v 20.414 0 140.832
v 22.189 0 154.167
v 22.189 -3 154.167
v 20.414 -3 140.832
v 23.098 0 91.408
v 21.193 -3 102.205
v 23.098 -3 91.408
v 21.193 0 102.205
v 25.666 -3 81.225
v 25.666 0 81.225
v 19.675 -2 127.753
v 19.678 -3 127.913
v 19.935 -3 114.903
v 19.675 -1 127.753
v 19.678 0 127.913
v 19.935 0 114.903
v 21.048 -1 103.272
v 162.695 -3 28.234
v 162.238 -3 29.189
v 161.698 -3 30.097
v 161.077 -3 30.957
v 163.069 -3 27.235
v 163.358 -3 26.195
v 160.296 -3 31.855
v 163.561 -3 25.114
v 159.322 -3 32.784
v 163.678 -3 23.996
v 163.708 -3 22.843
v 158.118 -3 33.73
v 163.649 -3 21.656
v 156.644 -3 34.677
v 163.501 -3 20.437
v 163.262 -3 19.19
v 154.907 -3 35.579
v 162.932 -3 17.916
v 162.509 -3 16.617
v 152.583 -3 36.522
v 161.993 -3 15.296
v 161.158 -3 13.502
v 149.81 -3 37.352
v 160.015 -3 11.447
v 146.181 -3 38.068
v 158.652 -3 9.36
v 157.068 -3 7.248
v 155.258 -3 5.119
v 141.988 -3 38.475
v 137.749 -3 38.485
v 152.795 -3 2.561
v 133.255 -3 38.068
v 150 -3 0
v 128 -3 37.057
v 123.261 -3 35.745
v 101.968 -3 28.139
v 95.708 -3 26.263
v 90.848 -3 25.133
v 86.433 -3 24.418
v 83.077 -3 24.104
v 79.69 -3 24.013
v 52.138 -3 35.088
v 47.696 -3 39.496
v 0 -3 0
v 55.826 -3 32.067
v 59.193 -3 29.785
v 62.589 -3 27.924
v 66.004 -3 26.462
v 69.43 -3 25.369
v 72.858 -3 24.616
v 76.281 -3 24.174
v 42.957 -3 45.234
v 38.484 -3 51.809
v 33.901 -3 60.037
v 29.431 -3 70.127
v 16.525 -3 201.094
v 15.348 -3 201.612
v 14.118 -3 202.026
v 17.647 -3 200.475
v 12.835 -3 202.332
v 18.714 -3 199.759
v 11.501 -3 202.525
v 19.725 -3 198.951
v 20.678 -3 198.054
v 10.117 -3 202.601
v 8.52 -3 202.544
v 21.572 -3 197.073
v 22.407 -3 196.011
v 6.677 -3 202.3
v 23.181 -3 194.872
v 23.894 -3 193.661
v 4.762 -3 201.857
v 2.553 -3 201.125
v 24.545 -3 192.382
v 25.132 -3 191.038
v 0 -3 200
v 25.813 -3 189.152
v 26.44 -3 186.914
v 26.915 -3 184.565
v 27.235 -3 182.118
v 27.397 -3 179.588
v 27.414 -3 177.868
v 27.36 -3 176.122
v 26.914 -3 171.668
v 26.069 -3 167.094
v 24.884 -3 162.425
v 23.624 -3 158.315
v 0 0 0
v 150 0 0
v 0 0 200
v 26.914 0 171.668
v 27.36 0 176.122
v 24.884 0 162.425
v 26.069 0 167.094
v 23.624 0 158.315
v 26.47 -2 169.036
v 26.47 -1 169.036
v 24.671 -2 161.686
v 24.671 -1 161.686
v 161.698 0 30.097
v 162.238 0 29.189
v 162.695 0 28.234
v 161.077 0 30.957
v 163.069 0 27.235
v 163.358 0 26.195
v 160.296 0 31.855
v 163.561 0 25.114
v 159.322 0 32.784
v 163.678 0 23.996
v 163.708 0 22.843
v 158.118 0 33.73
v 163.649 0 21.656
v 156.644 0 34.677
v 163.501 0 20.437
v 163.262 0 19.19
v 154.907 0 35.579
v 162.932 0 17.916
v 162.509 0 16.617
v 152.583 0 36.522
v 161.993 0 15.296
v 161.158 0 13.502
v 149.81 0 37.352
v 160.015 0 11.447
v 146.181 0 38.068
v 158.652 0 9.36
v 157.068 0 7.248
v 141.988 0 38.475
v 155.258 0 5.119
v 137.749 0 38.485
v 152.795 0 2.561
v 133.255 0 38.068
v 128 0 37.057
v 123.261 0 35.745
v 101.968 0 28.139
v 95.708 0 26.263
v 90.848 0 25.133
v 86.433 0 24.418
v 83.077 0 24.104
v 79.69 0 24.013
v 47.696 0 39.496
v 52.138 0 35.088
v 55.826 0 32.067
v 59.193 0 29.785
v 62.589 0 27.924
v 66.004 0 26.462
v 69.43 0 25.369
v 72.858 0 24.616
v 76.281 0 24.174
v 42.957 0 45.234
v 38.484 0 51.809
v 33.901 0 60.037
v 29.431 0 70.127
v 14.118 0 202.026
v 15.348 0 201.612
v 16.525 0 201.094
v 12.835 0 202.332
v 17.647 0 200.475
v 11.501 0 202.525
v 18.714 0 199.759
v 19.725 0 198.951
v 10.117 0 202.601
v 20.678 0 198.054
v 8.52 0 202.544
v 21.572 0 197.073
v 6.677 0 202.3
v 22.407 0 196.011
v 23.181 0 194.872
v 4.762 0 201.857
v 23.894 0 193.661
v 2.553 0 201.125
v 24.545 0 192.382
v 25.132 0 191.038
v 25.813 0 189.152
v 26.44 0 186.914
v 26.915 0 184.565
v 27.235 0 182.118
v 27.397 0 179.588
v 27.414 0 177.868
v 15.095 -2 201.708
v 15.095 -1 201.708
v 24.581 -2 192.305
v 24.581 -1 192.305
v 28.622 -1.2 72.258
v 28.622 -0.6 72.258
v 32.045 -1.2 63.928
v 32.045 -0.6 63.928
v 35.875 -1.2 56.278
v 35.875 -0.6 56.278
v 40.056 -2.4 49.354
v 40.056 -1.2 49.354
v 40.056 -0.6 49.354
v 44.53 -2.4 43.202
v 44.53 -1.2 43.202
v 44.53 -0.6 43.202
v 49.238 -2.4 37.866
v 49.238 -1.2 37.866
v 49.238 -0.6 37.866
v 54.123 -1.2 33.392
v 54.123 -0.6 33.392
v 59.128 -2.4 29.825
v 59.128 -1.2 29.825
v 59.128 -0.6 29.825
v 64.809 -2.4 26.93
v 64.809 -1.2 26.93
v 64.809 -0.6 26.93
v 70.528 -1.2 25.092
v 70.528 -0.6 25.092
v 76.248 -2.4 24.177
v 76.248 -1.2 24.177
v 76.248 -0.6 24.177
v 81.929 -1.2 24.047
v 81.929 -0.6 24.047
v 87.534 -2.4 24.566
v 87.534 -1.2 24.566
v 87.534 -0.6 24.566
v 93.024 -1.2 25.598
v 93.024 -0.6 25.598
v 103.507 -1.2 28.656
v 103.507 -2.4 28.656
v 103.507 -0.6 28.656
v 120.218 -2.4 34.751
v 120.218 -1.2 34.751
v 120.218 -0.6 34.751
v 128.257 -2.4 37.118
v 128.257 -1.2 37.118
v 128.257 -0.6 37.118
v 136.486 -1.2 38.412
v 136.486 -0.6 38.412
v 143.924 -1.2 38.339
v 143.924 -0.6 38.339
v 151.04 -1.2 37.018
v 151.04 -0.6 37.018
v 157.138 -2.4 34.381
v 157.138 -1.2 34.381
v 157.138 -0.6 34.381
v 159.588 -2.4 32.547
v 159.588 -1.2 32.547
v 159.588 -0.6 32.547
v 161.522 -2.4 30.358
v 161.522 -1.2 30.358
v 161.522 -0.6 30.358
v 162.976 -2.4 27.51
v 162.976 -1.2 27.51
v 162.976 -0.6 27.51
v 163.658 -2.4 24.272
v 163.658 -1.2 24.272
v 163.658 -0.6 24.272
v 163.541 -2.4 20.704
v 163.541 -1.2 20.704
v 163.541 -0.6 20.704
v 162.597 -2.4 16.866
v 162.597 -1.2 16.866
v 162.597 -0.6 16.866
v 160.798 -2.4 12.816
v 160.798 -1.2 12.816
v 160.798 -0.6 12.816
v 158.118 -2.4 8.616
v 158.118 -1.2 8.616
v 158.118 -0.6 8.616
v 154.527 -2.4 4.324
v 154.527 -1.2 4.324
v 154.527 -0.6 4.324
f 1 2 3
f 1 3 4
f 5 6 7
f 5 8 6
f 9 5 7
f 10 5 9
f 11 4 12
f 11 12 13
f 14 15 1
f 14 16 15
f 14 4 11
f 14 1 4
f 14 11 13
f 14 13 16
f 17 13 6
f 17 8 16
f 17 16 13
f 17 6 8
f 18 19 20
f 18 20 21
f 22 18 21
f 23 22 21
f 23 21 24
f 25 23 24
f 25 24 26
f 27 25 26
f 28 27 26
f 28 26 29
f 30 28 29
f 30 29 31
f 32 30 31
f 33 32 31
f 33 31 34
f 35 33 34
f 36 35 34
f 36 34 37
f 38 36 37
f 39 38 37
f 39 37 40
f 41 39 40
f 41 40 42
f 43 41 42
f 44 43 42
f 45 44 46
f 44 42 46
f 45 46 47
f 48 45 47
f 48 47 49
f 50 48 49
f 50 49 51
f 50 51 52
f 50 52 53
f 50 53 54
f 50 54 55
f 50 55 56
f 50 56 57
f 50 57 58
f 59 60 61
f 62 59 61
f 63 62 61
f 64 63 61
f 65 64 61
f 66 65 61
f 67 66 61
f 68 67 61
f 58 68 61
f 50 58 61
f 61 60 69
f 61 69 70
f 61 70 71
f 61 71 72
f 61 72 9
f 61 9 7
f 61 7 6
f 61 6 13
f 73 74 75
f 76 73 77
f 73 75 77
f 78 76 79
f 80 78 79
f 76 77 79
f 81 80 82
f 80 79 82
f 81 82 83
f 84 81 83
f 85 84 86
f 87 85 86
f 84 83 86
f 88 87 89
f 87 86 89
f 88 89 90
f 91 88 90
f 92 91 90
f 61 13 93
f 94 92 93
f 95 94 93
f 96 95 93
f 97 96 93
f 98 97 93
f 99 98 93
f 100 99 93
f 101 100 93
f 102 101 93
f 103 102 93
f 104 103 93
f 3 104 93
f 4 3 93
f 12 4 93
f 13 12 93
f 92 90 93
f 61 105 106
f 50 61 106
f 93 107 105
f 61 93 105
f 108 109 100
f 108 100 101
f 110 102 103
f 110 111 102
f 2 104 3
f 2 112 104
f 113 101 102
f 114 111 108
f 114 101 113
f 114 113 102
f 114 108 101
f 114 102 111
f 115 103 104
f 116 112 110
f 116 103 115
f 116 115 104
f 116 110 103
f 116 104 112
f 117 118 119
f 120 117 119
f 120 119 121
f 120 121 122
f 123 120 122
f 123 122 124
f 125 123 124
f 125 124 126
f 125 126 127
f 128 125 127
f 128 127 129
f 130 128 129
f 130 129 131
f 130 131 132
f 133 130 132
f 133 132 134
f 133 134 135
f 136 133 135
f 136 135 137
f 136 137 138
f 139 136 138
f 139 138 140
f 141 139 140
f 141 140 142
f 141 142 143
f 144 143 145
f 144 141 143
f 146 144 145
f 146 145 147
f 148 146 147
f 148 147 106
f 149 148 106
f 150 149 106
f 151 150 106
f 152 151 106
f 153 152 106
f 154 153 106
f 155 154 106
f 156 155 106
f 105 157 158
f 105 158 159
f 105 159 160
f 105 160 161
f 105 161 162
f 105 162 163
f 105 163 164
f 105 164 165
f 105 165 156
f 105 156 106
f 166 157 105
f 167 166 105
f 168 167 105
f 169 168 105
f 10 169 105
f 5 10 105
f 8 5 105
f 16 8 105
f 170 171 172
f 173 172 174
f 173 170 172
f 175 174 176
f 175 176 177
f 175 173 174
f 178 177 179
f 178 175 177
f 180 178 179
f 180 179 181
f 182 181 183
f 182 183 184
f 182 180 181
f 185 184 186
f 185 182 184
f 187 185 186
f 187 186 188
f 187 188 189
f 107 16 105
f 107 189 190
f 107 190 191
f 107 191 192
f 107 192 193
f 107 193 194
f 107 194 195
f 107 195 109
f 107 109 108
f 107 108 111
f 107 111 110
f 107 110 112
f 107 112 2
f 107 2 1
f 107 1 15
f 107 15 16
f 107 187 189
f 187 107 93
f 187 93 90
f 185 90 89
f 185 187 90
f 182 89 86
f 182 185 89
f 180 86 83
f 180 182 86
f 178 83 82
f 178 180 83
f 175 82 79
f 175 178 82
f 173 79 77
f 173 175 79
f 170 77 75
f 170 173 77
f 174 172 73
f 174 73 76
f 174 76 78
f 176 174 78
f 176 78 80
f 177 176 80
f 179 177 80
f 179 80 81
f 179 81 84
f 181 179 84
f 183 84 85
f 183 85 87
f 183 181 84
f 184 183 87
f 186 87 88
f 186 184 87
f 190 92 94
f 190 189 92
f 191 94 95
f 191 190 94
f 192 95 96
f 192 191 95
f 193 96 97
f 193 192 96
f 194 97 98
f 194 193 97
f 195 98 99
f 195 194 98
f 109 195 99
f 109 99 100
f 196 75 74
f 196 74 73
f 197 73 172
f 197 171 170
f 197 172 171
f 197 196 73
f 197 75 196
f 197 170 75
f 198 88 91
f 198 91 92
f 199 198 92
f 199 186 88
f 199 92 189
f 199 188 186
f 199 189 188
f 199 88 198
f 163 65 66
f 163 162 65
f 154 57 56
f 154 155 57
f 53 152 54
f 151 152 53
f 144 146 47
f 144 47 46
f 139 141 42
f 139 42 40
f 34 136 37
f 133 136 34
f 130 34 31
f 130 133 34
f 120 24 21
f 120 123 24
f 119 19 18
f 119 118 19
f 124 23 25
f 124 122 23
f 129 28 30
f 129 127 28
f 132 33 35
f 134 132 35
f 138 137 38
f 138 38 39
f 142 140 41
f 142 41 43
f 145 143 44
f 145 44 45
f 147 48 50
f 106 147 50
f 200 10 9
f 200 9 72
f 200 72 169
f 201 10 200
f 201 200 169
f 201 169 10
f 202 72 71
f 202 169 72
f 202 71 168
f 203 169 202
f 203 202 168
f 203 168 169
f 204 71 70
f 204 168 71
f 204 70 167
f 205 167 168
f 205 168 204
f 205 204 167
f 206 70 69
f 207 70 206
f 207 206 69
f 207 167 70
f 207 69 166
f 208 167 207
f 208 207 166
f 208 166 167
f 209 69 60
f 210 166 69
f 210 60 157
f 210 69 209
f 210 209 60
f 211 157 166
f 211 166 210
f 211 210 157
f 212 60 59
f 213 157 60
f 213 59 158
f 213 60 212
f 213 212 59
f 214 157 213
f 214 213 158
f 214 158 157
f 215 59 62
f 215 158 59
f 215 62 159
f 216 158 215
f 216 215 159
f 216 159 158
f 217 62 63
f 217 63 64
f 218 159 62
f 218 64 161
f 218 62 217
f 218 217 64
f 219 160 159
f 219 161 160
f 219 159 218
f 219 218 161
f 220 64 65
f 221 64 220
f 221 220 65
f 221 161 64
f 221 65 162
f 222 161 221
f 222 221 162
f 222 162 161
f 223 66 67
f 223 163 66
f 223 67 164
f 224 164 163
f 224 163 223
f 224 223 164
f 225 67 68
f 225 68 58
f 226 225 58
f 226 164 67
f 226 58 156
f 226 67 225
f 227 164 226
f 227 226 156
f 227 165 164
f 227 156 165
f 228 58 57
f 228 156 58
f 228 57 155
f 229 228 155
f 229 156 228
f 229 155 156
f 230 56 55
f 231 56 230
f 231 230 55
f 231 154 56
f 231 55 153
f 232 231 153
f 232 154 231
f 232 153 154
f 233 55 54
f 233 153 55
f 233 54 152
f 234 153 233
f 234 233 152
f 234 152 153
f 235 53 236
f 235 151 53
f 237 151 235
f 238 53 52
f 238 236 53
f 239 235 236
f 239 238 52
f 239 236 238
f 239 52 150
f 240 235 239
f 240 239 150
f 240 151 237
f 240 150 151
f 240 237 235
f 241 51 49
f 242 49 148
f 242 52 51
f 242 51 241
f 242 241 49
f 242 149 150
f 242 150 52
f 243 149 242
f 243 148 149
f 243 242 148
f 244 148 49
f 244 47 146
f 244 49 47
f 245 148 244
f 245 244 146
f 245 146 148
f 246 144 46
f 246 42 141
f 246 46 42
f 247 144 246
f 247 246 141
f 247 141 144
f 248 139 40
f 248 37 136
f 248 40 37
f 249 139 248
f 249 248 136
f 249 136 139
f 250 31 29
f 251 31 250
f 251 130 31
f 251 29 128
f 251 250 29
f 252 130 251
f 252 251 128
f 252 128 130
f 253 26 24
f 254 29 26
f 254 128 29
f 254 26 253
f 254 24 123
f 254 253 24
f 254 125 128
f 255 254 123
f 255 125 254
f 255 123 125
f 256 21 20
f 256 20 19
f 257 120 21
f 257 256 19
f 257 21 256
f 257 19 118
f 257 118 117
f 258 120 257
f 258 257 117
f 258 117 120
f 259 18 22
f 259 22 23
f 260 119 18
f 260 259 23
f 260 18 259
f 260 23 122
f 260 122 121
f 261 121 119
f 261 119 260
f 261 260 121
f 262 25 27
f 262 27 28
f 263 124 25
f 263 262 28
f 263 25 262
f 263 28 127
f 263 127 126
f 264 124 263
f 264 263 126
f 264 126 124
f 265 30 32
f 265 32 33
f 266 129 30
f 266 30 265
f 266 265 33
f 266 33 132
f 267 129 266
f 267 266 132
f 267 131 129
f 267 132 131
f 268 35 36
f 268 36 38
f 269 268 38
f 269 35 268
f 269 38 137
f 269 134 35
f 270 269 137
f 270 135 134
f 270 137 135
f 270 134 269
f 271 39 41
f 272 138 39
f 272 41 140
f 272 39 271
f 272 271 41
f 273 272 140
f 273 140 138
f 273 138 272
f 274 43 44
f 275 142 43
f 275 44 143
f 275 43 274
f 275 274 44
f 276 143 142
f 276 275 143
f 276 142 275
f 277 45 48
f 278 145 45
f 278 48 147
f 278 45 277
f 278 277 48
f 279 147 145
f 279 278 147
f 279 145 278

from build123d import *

# Parameters (mm, degrees)
F1_DEPTH = 3


with BuildPart() as f1:
    # F0 (on Front) → F1 (new body)
    with BuildSketch(Plane.XZ):
        with BuildLine():
            add(Edge.make_bspline(
                [(0, 200), (17.5350010591, 208.7052251042), (28.2990167117, 194.2533942124), (27.3598209023, 176.1217862368)],
                knots=[0, 0, 0, 0, 0.2121816796, 0.2121816796, 0.2121816796, 0.2121816796], degree=3))
            Line((0, 200), (0, 0))
            Line((0, 0), (150, 0))
            add(Edge.make_bspline(
                [(25.6660213946, 81.2246880313), (32.8761299375, 56.5068863186), (60.0117036649, 17.4585313325), (104.0532180707, 27.1280796833), (133.9334309453, 41.9003481082), (169.1529761494, 33.9703926018), (163.3473671479, 11.5198906648), (150, 0)],
                knots=[0.1766304626, 0.1766304626, 0.1766304626, 0.1766304626, 0.3437936291, 0.5310100844, 0.6957912123, 0.8398868931, 1, 1, 1, 1], degree=3))
            add(Edge.make_bspline(
                [(22.1886454738, 154.1668037154), (13.9805728557, 131.5466692926), (-6.7542086215, 97.2923947246), (17.0207337498, 84.6439779907), (25.666021385, 81.2246880244)],
                knots=[0.2931971005, 0.2931971005, 0.2931971005, 0.2931971005, 0.5352029466, 0.6440385187, 0.6440385187, 0.6440385187, 0.6440385187], degree=3))
            add(Edge.make_bspline(
                [(27.3598209023, 176.1217862368), (25.1275690328, 168.6815010828), (23.4215283398, 161.3493559456), (22.1886454738, 154.1668037154)],
                knots=[0, 0, 0, 0, 0.0368844878, 0.0368844878, 0.0368844878, 0.0368844878], degree=3))
        make_face()
        with BuildLine():
            add(Edge.make_bspline(
                [(27.3598209023, 176.1217862368), (27.0012162201, 169.1987575651), (24.9364322264, 161.7392642187), (22.1886454738, 154.1668037154)],
                knots=[0.2121816796, 0.2121816796, 0.2121816796, 0.2121816796, 0.2931971005, 0.2931971005, 0.2931971005, 0.2931971005], degree=3))
            add(Edge.make_bspline(
                [(27.3598209023, 176.1217862368), (25.1275690328, 168.6815010828), (23.4215283398, 161.3493559456), (22.1886454738, 154.1668037154)],
                knots=[0, 0, 0, 0, 0.0368844878, 0.0368844878, 0.0368844878, 0.0368844878], degree=3))
        make_face()
        with BuildLine():
            add(Edge.make_bspline(
                [(22.1886454738, 154.1668037154), (17.5175648086, 126.9539339651), (19.6384755701, 101.8884105841), (25.6660213946, 81.2246880313)],
                knots=[0.0368844878, 0.0368844878, 0.0368844878, 0.0368844878, 0.1766304626, 0.1766304626, 0.1766304626, 0.1766304626], degree=3))
            add(Edge.make_bspline(
                [(22.1886454738, 154.1668037154), (13.9805728557, 131.5466692926), (-6.7542086215, 97.2923947246), (17.0207337498, 84.6439779907), (25.666021385, 81.2246880244)],
                knots=[0.2931971005, 0.2931971005, 0.2931971005, 0.2931971005, 0.5352029466, 0.6440385187, 0.6440385187, 0.6440385187, 0.6440385187], degree=3))
        make_face()
    extrude(amount=F1_DEPTH)


solid = f1.part
